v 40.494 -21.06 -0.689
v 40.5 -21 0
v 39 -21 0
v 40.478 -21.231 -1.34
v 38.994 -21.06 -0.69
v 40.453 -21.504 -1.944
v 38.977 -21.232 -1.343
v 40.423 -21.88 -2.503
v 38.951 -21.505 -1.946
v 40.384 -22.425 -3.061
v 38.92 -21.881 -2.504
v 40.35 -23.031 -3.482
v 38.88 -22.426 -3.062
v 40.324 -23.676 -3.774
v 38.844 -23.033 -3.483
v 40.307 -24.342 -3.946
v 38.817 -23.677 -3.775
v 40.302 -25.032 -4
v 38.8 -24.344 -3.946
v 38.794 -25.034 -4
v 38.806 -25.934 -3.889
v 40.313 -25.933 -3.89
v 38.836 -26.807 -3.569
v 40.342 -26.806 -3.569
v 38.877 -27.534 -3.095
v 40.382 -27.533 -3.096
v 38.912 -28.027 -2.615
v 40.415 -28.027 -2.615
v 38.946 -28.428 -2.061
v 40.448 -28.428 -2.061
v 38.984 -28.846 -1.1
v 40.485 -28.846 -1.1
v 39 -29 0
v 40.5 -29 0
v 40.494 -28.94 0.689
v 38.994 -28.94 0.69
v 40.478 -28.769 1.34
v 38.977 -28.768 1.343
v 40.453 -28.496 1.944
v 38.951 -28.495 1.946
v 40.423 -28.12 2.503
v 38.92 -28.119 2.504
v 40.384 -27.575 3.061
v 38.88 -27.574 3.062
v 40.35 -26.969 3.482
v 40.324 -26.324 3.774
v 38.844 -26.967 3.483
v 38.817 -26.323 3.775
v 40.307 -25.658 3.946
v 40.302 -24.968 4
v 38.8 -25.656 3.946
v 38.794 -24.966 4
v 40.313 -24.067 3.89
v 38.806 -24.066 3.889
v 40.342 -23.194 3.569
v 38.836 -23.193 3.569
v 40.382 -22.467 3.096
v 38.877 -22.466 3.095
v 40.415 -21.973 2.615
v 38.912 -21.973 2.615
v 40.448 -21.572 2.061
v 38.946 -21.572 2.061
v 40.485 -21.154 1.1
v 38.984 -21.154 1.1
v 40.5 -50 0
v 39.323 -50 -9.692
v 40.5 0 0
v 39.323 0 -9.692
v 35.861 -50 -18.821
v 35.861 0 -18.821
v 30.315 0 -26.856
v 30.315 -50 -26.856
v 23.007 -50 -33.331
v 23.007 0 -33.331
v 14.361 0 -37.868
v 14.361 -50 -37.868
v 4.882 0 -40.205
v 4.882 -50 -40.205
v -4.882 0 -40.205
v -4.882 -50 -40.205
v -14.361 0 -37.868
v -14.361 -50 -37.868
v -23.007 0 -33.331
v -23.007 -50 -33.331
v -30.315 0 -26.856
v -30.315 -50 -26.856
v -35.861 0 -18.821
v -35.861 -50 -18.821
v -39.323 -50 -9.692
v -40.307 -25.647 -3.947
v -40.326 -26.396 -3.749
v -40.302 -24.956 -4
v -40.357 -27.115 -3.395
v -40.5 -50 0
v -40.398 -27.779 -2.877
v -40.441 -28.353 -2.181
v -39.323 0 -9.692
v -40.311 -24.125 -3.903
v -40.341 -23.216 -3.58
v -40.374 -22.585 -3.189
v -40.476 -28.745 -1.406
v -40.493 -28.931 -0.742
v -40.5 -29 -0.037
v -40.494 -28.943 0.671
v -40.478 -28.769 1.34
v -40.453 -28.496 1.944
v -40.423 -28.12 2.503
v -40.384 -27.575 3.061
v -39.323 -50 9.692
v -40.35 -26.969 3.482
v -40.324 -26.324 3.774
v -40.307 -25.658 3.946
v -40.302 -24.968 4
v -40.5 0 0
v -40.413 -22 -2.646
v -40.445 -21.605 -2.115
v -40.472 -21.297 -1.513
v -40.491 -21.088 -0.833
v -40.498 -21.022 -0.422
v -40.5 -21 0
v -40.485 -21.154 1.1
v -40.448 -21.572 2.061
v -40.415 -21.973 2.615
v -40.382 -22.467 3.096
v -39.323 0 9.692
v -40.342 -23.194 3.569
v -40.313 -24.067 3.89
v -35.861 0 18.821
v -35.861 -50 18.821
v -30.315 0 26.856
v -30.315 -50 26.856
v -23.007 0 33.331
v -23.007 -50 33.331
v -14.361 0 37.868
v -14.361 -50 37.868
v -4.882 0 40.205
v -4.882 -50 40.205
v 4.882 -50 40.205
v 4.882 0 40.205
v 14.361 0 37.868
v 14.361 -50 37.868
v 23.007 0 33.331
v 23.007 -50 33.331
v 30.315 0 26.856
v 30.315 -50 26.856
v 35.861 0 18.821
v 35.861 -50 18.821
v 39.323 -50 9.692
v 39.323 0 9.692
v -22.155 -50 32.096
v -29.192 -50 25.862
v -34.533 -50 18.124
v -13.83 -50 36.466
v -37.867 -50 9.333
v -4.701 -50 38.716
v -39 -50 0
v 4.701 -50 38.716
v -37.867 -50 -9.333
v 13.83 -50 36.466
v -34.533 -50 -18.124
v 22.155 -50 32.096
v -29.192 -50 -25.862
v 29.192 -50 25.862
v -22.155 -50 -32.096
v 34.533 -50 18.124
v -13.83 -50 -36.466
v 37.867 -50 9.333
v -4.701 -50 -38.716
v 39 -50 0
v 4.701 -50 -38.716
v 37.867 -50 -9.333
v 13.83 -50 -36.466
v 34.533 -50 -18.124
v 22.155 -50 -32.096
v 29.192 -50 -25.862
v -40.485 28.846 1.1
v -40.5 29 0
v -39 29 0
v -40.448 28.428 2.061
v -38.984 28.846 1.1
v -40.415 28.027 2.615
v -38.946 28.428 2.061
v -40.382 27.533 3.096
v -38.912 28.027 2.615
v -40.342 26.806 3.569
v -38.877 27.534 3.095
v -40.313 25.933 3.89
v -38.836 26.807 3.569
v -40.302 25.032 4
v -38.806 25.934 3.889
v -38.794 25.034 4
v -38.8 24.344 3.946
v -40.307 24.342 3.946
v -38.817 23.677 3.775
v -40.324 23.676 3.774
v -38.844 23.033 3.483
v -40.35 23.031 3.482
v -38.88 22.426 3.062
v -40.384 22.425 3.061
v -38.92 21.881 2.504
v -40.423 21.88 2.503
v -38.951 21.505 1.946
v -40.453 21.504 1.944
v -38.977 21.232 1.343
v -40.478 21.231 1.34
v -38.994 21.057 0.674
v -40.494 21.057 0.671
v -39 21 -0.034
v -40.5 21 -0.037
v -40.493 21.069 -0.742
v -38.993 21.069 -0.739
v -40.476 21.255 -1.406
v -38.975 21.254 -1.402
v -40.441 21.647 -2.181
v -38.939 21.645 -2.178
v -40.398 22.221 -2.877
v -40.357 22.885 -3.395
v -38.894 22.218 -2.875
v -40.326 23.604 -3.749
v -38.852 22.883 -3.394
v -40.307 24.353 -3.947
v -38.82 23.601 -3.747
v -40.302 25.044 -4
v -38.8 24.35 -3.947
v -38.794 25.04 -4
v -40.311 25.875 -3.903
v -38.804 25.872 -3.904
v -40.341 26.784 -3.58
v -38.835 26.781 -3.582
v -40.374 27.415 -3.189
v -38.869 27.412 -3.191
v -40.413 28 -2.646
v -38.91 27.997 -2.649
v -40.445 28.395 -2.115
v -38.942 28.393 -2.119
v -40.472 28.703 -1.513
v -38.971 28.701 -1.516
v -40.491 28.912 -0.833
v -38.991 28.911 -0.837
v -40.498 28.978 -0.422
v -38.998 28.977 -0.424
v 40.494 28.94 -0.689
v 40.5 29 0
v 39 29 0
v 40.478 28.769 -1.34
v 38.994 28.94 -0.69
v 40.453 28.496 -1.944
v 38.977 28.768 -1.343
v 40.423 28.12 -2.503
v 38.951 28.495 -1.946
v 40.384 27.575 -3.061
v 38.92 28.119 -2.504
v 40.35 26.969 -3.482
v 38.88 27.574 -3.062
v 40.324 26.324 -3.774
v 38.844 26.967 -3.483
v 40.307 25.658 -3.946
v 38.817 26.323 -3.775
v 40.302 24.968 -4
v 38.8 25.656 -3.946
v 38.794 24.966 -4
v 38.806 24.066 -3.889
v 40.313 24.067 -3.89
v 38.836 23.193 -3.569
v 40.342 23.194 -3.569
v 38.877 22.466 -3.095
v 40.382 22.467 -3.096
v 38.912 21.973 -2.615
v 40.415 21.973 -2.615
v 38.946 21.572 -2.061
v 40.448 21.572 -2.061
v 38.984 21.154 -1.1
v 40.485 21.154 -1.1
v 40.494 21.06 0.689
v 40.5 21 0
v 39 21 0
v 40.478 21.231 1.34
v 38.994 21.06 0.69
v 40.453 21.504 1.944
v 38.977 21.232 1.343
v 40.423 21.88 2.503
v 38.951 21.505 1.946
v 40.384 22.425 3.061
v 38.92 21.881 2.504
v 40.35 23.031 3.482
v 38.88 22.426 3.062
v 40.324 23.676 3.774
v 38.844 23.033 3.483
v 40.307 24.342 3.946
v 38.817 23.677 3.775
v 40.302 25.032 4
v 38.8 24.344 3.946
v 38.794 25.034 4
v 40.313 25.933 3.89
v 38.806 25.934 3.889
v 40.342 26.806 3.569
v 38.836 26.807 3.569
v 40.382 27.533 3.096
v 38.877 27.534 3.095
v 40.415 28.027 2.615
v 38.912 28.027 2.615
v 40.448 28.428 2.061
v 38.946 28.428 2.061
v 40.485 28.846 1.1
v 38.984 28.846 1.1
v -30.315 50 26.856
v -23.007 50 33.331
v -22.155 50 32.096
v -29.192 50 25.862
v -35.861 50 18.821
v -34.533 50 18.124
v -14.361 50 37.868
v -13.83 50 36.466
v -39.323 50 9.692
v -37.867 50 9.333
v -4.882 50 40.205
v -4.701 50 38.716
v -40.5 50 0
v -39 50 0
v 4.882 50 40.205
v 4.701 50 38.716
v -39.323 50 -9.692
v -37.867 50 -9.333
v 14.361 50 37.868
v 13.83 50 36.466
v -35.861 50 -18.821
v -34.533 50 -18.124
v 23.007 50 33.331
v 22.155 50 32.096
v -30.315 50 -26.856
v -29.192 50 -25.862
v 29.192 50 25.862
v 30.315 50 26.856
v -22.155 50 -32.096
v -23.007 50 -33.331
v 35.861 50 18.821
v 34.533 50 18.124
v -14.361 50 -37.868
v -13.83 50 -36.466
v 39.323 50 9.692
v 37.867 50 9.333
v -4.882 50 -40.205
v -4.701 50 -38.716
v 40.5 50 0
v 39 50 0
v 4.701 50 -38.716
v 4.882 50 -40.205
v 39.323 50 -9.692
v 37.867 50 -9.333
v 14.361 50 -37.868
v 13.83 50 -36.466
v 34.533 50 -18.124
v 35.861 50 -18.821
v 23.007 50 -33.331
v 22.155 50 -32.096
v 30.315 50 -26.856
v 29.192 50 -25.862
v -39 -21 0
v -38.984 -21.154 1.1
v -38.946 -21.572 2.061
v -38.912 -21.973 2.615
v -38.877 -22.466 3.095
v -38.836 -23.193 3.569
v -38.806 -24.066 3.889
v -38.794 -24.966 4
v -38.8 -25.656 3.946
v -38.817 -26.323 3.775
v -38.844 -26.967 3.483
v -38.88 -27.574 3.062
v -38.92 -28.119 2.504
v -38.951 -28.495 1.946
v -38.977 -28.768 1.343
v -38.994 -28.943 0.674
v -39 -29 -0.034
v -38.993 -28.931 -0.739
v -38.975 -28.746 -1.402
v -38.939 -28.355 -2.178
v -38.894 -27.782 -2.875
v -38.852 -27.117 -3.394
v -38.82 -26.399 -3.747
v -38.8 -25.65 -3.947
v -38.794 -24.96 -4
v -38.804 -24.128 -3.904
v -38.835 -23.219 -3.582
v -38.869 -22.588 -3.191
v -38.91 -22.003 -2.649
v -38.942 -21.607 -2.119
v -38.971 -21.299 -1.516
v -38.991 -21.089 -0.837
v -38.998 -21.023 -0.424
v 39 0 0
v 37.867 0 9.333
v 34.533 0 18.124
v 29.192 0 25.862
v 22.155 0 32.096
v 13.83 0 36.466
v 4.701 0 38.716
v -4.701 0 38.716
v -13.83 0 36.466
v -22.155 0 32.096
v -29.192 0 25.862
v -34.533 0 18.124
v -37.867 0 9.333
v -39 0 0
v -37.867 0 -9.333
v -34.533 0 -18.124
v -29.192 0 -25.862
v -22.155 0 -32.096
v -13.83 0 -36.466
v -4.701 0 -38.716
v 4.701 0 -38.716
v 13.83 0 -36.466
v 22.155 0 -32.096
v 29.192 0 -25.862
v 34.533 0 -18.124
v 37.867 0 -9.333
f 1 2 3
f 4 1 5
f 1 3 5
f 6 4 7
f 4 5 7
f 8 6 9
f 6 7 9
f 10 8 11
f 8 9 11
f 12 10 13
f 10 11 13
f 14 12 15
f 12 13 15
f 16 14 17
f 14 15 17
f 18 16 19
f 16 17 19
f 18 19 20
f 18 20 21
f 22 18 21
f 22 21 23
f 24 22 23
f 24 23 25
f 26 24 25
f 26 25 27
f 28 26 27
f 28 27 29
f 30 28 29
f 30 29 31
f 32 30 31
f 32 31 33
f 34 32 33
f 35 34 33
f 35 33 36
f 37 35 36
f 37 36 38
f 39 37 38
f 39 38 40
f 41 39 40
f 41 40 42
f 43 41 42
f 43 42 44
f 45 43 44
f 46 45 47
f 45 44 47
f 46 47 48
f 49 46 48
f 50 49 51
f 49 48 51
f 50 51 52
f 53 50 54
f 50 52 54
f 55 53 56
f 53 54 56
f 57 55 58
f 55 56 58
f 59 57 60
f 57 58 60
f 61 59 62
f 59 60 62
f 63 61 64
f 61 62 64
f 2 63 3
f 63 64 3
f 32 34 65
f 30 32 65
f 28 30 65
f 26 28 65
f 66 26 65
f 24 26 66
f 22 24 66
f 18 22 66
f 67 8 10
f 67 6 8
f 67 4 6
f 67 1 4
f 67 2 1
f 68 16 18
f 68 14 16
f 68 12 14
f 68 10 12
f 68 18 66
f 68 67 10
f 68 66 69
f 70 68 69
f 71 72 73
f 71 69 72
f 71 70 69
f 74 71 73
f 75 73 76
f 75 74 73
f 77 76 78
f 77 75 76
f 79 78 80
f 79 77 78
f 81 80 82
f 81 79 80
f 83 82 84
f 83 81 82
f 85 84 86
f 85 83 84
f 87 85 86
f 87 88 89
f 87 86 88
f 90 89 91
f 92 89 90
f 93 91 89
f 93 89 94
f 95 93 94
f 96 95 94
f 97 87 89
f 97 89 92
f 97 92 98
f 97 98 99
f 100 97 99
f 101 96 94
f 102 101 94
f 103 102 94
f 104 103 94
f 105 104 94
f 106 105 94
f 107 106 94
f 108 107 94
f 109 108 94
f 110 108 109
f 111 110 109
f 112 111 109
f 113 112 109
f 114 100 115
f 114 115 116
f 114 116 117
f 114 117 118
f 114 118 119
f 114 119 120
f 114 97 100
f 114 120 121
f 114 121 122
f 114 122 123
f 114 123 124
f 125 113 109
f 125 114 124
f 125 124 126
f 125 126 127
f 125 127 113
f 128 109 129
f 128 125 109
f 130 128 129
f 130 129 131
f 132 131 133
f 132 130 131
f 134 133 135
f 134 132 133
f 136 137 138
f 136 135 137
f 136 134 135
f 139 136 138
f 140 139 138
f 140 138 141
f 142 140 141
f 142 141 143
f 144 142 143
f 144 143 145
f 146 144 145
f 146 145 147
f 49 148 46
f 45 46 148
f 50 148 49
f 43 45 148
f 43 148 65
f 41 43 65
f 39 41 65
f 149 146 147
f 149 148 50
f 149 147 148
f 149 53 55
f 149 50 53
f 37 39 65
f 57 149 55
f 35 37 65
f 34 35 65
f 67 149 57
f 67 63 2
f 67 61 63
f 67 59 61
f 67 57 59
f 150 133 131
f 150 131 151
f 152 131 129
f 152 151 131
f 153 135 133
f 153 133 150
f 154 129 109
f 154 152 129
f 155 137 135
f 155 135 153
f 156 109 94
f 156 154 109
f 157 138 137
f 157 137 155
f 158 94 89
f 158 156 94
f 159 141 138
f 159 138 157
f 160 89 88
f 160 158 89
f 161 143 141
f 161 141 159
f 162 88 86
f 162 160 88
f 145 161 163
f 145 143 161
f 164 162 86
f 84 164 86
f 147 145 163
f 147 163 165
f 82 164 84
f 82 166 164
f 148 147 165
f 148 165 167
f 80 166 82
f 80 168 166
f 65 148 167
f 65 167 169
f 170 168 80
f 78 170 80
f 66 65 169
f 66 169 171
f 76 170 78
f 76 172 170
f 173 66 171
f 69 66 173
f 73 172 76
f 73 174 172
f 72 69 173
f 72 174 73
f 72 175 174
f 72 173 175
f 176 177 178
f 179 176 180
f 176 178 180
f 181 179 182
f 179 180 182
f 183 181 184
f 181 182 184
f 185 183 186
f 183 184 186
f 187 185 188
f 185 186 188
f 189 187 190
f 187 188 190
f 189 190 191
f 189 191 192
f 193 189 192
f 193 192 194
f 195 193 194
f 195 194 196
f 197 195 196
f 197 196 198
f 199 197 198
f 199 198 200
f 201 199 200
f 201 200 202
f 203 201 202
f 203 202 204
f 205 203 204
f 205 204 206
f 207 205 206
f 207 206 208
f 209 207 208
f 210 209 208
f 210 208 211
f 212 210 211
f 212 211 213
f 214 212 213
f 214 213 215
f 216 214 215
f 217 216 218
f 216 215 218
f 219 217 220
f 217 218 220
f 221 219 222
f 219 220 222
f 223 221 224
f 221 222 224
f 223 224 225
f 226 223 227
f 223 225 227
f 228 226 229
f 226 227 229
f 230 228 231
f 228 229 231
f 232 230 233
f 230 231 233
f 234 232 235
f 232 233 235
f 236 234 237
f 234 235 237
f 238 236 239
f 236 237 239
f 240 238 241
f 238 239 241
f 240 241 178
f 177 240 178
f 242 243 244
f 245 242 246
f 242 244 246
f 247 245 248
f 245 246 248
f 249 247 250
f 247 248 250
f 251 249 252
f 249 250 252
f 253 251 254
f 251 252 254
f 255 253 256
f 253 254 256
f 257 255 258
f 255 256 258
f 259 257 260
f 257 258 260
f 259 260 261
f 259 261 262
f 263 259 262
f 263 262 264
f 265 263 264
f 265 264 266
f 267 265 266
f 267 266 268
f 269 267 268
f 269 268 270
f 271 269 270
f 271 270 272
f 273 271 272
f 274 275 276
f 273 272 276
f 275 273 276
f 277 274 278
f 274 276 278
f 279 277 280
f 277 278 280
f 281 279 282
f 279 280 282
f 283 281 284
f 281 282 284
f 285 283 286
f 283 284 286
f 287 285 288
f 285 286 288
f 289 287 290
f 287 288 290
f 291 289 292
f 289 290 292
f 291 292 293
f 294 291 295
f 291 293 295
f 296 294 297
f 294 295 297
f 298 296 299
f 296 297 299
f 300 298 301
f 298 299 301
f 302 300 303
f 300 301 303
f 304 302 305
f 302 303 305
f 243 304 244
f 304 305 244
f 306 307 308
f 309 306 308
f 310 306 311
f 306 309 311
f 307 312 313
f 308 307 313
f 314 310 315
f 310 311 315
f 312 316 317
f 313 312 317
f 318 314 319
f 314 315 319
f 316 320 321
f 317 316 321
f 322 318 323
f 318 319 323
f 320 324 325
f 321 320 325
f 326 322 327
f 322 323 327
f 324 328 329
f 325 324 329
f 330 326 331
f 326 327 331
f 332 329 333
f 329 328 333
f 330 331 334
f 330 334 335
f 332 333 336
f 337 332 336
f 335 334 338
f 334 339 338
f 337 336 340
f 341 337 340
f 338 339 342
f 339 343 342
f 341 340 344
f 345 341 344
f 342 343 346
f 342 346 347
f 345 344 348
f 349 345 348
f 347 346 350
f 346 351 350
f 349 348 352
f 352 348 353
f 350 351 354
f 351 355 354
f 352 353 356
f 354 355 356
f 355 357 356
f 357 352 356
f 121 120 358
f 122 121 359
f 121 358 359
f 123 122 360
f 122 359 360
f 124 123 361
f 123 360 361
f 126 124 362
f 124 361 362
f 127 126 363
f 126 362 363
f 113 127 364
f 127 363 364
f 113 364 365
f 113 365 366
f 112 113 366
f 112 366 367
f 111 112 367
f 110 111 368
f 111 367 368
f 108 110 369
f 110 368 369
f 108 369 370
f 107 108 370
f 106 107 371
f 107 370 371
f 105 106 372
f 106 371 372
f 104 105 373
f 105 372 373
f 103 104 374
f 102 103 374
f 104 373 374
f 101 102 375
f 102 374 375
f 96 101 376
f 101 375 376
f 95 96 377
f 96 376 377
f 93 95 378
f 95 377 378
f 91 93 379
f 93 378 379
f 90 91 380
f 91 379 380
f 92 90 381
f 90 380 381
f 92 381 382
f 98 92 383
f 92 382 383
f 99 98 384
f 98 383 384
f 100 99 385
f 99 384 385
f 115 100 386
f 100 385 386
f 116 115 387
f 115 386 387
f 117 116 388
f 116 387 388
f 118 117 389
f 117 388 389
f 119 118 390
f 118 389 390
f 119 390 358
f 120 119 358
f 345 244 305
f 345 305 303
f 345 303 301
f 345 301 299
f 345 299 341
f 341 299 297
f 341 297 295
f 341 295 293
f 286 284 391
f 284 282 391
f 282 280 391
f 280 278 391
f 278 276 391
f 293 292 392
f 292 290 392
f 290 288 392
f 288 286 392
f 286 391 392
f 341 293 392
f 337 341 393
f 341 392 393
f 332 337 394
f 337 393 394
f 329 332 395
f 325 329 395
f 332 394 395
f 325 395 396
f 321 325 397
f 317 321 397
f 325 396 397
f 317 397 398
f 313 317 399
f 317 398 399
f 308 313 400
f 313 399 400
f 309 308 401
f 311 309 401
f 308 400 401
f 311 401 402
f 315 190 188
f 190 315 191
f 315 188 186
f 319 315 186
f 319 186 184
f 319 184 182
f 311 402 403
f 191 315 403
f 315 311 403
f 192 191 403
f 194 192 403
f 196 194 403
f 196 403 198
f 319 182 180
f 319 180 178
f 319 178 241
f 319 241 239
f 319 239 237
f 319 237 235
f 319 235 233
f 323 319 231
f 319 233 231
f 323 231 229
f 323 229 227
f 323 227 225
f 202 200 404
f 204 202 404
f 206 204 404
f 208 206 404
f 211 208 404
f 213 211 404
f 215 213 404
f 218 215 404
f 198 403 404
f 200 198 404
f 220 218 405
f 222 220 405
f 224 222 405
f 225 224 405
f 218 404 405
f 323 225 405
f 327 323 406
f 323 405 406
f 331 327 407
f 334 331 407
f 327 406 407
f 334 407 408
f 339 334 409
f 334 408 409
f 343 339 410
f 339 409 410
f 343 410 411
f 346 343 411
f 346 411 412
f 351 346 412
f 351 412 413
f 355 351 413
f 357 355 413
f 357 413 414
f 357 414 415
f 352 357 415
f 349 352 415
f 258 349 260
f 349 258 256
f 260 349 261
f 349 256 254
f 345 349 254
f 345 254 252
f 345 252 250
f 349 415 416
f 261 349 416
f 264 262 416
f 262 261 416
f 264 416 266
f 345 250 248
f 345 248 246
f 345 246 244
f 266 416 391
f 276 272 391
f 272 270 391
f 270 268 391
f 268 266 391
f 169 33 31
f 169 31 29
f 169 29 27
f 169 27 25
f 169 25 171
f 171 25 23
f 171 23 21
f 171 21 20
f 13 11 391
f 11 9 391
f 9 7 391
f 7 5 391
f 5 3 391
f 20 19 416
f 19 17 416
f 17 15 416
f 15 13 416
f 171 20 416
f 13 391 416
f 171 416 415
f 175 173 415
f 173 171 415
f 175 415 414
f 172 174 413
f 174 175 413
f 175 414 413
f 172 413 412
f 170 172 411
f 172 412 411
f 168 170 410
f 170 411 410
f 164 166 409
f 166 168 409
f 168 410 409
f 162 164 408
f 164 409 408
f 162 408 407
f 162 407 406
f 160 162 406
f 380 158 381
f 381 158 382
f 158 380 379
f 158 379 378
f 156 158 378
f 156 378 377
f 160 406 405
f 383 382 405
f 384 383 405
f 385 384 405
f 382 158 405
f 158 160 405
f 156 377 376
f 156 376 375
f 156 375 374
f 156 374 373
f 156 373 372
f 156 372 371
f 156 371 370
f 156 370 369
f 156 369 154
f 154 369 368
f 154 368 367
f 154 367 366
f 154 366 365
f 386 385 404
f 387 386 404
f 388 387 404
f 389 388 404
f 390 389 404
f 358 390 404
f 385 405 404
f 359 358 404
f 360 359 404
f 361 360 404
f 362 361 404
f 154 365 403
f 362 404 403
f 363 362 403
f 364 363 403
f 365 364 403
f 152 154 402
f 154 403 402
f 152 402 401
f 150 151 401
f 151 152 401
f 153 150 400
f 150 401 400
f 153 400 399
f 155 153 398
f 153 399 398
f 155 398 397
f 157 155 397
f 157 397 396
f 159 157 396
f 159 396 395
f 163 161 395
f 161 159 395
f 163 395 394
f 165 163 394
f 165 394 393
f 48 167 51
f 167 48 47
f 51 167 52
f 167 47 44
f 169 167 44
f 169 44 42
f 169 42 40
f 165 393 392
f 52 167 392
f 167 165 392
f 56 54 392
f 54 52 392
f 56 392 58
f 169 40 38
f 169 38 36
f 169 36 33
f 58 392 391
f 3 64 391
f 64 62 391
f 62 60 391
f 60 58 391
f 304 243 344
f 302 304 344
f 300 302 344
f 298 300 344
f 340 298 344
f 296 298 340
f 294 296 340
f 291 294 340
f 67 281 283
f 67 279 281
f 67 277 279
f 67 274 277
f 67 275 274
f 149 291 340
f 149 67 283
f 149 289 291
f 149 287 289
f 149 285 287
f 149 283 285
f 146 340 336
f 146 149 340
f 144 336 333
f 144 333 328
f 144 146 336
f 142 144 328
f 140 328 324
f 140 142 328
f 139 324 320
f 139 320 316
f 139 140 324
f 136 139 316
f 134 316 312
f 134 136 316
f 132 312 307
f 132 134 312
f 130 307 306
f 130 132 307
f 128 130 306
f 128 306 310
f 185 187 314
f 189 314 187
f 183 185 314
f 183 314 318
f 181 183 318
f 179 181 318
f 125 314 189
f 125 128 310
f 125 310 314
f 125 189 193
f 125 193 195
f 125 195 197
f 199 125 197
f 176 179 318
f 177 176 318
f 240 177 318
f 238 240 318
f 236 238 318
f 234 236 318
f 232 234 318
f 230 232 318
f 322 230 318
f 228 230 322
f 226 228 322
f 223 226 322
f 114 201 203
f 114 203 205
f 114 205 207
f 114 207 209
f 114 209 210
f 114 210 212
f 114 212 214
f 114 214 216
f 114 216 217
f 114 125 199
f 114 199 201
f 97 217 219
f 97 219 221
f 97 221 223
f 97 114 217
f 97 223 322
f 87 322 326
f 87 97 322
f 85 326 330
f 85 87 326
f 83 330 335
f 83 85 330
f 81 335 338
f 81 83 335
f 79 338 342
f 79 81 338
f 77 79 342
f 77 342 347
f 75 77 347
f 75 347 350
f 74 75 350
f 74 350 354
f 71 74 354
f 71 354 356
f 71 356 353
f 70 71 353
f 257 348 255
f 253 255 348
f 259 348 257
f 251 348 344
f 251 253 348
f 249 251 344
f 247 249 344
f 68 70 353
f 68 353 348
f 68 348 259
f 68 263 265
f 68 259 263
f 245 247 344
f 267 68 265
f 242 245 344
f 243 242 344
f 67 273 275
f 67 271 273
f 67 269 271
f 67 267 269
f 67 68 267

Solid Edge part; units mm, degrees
sketch "Sketch1" plane through (0, 0, 0) normal (0, -1, 0) x (1, 0, 0)
  circle A0 centre (0, 0) radius 40.5
extrude "Protrusion1" add sketch "Sketch1" along normal mid plane 100
sketch "Sketch2" plane through (0, 0, 0) normal (0, -1, 0) x (1, 0, 0)
  circle A0 centre (0, 0) radius 39
extrude "ExtrudedCutout_1" cut sketch "Sketch2" along normal mid plane 100
sketch "Sketch3" plane through (0, 0, 0) normal (1, 0, 0) x (0, 1, 0)
  circle A0 centre (-25, 0) radius 4
extrude "Cutout1" cut sketch "Sketch3" along normal mid plane 85
sketch "Sketch4" plane through (0, 0, 0) normal (1, 0, 0) x (0, 1, 0)
  circle A0 centre (25, 0) radius 4
extrude "ExtrudedCutout_5" cut sketch "Sketch4" along normal mid plane 85
